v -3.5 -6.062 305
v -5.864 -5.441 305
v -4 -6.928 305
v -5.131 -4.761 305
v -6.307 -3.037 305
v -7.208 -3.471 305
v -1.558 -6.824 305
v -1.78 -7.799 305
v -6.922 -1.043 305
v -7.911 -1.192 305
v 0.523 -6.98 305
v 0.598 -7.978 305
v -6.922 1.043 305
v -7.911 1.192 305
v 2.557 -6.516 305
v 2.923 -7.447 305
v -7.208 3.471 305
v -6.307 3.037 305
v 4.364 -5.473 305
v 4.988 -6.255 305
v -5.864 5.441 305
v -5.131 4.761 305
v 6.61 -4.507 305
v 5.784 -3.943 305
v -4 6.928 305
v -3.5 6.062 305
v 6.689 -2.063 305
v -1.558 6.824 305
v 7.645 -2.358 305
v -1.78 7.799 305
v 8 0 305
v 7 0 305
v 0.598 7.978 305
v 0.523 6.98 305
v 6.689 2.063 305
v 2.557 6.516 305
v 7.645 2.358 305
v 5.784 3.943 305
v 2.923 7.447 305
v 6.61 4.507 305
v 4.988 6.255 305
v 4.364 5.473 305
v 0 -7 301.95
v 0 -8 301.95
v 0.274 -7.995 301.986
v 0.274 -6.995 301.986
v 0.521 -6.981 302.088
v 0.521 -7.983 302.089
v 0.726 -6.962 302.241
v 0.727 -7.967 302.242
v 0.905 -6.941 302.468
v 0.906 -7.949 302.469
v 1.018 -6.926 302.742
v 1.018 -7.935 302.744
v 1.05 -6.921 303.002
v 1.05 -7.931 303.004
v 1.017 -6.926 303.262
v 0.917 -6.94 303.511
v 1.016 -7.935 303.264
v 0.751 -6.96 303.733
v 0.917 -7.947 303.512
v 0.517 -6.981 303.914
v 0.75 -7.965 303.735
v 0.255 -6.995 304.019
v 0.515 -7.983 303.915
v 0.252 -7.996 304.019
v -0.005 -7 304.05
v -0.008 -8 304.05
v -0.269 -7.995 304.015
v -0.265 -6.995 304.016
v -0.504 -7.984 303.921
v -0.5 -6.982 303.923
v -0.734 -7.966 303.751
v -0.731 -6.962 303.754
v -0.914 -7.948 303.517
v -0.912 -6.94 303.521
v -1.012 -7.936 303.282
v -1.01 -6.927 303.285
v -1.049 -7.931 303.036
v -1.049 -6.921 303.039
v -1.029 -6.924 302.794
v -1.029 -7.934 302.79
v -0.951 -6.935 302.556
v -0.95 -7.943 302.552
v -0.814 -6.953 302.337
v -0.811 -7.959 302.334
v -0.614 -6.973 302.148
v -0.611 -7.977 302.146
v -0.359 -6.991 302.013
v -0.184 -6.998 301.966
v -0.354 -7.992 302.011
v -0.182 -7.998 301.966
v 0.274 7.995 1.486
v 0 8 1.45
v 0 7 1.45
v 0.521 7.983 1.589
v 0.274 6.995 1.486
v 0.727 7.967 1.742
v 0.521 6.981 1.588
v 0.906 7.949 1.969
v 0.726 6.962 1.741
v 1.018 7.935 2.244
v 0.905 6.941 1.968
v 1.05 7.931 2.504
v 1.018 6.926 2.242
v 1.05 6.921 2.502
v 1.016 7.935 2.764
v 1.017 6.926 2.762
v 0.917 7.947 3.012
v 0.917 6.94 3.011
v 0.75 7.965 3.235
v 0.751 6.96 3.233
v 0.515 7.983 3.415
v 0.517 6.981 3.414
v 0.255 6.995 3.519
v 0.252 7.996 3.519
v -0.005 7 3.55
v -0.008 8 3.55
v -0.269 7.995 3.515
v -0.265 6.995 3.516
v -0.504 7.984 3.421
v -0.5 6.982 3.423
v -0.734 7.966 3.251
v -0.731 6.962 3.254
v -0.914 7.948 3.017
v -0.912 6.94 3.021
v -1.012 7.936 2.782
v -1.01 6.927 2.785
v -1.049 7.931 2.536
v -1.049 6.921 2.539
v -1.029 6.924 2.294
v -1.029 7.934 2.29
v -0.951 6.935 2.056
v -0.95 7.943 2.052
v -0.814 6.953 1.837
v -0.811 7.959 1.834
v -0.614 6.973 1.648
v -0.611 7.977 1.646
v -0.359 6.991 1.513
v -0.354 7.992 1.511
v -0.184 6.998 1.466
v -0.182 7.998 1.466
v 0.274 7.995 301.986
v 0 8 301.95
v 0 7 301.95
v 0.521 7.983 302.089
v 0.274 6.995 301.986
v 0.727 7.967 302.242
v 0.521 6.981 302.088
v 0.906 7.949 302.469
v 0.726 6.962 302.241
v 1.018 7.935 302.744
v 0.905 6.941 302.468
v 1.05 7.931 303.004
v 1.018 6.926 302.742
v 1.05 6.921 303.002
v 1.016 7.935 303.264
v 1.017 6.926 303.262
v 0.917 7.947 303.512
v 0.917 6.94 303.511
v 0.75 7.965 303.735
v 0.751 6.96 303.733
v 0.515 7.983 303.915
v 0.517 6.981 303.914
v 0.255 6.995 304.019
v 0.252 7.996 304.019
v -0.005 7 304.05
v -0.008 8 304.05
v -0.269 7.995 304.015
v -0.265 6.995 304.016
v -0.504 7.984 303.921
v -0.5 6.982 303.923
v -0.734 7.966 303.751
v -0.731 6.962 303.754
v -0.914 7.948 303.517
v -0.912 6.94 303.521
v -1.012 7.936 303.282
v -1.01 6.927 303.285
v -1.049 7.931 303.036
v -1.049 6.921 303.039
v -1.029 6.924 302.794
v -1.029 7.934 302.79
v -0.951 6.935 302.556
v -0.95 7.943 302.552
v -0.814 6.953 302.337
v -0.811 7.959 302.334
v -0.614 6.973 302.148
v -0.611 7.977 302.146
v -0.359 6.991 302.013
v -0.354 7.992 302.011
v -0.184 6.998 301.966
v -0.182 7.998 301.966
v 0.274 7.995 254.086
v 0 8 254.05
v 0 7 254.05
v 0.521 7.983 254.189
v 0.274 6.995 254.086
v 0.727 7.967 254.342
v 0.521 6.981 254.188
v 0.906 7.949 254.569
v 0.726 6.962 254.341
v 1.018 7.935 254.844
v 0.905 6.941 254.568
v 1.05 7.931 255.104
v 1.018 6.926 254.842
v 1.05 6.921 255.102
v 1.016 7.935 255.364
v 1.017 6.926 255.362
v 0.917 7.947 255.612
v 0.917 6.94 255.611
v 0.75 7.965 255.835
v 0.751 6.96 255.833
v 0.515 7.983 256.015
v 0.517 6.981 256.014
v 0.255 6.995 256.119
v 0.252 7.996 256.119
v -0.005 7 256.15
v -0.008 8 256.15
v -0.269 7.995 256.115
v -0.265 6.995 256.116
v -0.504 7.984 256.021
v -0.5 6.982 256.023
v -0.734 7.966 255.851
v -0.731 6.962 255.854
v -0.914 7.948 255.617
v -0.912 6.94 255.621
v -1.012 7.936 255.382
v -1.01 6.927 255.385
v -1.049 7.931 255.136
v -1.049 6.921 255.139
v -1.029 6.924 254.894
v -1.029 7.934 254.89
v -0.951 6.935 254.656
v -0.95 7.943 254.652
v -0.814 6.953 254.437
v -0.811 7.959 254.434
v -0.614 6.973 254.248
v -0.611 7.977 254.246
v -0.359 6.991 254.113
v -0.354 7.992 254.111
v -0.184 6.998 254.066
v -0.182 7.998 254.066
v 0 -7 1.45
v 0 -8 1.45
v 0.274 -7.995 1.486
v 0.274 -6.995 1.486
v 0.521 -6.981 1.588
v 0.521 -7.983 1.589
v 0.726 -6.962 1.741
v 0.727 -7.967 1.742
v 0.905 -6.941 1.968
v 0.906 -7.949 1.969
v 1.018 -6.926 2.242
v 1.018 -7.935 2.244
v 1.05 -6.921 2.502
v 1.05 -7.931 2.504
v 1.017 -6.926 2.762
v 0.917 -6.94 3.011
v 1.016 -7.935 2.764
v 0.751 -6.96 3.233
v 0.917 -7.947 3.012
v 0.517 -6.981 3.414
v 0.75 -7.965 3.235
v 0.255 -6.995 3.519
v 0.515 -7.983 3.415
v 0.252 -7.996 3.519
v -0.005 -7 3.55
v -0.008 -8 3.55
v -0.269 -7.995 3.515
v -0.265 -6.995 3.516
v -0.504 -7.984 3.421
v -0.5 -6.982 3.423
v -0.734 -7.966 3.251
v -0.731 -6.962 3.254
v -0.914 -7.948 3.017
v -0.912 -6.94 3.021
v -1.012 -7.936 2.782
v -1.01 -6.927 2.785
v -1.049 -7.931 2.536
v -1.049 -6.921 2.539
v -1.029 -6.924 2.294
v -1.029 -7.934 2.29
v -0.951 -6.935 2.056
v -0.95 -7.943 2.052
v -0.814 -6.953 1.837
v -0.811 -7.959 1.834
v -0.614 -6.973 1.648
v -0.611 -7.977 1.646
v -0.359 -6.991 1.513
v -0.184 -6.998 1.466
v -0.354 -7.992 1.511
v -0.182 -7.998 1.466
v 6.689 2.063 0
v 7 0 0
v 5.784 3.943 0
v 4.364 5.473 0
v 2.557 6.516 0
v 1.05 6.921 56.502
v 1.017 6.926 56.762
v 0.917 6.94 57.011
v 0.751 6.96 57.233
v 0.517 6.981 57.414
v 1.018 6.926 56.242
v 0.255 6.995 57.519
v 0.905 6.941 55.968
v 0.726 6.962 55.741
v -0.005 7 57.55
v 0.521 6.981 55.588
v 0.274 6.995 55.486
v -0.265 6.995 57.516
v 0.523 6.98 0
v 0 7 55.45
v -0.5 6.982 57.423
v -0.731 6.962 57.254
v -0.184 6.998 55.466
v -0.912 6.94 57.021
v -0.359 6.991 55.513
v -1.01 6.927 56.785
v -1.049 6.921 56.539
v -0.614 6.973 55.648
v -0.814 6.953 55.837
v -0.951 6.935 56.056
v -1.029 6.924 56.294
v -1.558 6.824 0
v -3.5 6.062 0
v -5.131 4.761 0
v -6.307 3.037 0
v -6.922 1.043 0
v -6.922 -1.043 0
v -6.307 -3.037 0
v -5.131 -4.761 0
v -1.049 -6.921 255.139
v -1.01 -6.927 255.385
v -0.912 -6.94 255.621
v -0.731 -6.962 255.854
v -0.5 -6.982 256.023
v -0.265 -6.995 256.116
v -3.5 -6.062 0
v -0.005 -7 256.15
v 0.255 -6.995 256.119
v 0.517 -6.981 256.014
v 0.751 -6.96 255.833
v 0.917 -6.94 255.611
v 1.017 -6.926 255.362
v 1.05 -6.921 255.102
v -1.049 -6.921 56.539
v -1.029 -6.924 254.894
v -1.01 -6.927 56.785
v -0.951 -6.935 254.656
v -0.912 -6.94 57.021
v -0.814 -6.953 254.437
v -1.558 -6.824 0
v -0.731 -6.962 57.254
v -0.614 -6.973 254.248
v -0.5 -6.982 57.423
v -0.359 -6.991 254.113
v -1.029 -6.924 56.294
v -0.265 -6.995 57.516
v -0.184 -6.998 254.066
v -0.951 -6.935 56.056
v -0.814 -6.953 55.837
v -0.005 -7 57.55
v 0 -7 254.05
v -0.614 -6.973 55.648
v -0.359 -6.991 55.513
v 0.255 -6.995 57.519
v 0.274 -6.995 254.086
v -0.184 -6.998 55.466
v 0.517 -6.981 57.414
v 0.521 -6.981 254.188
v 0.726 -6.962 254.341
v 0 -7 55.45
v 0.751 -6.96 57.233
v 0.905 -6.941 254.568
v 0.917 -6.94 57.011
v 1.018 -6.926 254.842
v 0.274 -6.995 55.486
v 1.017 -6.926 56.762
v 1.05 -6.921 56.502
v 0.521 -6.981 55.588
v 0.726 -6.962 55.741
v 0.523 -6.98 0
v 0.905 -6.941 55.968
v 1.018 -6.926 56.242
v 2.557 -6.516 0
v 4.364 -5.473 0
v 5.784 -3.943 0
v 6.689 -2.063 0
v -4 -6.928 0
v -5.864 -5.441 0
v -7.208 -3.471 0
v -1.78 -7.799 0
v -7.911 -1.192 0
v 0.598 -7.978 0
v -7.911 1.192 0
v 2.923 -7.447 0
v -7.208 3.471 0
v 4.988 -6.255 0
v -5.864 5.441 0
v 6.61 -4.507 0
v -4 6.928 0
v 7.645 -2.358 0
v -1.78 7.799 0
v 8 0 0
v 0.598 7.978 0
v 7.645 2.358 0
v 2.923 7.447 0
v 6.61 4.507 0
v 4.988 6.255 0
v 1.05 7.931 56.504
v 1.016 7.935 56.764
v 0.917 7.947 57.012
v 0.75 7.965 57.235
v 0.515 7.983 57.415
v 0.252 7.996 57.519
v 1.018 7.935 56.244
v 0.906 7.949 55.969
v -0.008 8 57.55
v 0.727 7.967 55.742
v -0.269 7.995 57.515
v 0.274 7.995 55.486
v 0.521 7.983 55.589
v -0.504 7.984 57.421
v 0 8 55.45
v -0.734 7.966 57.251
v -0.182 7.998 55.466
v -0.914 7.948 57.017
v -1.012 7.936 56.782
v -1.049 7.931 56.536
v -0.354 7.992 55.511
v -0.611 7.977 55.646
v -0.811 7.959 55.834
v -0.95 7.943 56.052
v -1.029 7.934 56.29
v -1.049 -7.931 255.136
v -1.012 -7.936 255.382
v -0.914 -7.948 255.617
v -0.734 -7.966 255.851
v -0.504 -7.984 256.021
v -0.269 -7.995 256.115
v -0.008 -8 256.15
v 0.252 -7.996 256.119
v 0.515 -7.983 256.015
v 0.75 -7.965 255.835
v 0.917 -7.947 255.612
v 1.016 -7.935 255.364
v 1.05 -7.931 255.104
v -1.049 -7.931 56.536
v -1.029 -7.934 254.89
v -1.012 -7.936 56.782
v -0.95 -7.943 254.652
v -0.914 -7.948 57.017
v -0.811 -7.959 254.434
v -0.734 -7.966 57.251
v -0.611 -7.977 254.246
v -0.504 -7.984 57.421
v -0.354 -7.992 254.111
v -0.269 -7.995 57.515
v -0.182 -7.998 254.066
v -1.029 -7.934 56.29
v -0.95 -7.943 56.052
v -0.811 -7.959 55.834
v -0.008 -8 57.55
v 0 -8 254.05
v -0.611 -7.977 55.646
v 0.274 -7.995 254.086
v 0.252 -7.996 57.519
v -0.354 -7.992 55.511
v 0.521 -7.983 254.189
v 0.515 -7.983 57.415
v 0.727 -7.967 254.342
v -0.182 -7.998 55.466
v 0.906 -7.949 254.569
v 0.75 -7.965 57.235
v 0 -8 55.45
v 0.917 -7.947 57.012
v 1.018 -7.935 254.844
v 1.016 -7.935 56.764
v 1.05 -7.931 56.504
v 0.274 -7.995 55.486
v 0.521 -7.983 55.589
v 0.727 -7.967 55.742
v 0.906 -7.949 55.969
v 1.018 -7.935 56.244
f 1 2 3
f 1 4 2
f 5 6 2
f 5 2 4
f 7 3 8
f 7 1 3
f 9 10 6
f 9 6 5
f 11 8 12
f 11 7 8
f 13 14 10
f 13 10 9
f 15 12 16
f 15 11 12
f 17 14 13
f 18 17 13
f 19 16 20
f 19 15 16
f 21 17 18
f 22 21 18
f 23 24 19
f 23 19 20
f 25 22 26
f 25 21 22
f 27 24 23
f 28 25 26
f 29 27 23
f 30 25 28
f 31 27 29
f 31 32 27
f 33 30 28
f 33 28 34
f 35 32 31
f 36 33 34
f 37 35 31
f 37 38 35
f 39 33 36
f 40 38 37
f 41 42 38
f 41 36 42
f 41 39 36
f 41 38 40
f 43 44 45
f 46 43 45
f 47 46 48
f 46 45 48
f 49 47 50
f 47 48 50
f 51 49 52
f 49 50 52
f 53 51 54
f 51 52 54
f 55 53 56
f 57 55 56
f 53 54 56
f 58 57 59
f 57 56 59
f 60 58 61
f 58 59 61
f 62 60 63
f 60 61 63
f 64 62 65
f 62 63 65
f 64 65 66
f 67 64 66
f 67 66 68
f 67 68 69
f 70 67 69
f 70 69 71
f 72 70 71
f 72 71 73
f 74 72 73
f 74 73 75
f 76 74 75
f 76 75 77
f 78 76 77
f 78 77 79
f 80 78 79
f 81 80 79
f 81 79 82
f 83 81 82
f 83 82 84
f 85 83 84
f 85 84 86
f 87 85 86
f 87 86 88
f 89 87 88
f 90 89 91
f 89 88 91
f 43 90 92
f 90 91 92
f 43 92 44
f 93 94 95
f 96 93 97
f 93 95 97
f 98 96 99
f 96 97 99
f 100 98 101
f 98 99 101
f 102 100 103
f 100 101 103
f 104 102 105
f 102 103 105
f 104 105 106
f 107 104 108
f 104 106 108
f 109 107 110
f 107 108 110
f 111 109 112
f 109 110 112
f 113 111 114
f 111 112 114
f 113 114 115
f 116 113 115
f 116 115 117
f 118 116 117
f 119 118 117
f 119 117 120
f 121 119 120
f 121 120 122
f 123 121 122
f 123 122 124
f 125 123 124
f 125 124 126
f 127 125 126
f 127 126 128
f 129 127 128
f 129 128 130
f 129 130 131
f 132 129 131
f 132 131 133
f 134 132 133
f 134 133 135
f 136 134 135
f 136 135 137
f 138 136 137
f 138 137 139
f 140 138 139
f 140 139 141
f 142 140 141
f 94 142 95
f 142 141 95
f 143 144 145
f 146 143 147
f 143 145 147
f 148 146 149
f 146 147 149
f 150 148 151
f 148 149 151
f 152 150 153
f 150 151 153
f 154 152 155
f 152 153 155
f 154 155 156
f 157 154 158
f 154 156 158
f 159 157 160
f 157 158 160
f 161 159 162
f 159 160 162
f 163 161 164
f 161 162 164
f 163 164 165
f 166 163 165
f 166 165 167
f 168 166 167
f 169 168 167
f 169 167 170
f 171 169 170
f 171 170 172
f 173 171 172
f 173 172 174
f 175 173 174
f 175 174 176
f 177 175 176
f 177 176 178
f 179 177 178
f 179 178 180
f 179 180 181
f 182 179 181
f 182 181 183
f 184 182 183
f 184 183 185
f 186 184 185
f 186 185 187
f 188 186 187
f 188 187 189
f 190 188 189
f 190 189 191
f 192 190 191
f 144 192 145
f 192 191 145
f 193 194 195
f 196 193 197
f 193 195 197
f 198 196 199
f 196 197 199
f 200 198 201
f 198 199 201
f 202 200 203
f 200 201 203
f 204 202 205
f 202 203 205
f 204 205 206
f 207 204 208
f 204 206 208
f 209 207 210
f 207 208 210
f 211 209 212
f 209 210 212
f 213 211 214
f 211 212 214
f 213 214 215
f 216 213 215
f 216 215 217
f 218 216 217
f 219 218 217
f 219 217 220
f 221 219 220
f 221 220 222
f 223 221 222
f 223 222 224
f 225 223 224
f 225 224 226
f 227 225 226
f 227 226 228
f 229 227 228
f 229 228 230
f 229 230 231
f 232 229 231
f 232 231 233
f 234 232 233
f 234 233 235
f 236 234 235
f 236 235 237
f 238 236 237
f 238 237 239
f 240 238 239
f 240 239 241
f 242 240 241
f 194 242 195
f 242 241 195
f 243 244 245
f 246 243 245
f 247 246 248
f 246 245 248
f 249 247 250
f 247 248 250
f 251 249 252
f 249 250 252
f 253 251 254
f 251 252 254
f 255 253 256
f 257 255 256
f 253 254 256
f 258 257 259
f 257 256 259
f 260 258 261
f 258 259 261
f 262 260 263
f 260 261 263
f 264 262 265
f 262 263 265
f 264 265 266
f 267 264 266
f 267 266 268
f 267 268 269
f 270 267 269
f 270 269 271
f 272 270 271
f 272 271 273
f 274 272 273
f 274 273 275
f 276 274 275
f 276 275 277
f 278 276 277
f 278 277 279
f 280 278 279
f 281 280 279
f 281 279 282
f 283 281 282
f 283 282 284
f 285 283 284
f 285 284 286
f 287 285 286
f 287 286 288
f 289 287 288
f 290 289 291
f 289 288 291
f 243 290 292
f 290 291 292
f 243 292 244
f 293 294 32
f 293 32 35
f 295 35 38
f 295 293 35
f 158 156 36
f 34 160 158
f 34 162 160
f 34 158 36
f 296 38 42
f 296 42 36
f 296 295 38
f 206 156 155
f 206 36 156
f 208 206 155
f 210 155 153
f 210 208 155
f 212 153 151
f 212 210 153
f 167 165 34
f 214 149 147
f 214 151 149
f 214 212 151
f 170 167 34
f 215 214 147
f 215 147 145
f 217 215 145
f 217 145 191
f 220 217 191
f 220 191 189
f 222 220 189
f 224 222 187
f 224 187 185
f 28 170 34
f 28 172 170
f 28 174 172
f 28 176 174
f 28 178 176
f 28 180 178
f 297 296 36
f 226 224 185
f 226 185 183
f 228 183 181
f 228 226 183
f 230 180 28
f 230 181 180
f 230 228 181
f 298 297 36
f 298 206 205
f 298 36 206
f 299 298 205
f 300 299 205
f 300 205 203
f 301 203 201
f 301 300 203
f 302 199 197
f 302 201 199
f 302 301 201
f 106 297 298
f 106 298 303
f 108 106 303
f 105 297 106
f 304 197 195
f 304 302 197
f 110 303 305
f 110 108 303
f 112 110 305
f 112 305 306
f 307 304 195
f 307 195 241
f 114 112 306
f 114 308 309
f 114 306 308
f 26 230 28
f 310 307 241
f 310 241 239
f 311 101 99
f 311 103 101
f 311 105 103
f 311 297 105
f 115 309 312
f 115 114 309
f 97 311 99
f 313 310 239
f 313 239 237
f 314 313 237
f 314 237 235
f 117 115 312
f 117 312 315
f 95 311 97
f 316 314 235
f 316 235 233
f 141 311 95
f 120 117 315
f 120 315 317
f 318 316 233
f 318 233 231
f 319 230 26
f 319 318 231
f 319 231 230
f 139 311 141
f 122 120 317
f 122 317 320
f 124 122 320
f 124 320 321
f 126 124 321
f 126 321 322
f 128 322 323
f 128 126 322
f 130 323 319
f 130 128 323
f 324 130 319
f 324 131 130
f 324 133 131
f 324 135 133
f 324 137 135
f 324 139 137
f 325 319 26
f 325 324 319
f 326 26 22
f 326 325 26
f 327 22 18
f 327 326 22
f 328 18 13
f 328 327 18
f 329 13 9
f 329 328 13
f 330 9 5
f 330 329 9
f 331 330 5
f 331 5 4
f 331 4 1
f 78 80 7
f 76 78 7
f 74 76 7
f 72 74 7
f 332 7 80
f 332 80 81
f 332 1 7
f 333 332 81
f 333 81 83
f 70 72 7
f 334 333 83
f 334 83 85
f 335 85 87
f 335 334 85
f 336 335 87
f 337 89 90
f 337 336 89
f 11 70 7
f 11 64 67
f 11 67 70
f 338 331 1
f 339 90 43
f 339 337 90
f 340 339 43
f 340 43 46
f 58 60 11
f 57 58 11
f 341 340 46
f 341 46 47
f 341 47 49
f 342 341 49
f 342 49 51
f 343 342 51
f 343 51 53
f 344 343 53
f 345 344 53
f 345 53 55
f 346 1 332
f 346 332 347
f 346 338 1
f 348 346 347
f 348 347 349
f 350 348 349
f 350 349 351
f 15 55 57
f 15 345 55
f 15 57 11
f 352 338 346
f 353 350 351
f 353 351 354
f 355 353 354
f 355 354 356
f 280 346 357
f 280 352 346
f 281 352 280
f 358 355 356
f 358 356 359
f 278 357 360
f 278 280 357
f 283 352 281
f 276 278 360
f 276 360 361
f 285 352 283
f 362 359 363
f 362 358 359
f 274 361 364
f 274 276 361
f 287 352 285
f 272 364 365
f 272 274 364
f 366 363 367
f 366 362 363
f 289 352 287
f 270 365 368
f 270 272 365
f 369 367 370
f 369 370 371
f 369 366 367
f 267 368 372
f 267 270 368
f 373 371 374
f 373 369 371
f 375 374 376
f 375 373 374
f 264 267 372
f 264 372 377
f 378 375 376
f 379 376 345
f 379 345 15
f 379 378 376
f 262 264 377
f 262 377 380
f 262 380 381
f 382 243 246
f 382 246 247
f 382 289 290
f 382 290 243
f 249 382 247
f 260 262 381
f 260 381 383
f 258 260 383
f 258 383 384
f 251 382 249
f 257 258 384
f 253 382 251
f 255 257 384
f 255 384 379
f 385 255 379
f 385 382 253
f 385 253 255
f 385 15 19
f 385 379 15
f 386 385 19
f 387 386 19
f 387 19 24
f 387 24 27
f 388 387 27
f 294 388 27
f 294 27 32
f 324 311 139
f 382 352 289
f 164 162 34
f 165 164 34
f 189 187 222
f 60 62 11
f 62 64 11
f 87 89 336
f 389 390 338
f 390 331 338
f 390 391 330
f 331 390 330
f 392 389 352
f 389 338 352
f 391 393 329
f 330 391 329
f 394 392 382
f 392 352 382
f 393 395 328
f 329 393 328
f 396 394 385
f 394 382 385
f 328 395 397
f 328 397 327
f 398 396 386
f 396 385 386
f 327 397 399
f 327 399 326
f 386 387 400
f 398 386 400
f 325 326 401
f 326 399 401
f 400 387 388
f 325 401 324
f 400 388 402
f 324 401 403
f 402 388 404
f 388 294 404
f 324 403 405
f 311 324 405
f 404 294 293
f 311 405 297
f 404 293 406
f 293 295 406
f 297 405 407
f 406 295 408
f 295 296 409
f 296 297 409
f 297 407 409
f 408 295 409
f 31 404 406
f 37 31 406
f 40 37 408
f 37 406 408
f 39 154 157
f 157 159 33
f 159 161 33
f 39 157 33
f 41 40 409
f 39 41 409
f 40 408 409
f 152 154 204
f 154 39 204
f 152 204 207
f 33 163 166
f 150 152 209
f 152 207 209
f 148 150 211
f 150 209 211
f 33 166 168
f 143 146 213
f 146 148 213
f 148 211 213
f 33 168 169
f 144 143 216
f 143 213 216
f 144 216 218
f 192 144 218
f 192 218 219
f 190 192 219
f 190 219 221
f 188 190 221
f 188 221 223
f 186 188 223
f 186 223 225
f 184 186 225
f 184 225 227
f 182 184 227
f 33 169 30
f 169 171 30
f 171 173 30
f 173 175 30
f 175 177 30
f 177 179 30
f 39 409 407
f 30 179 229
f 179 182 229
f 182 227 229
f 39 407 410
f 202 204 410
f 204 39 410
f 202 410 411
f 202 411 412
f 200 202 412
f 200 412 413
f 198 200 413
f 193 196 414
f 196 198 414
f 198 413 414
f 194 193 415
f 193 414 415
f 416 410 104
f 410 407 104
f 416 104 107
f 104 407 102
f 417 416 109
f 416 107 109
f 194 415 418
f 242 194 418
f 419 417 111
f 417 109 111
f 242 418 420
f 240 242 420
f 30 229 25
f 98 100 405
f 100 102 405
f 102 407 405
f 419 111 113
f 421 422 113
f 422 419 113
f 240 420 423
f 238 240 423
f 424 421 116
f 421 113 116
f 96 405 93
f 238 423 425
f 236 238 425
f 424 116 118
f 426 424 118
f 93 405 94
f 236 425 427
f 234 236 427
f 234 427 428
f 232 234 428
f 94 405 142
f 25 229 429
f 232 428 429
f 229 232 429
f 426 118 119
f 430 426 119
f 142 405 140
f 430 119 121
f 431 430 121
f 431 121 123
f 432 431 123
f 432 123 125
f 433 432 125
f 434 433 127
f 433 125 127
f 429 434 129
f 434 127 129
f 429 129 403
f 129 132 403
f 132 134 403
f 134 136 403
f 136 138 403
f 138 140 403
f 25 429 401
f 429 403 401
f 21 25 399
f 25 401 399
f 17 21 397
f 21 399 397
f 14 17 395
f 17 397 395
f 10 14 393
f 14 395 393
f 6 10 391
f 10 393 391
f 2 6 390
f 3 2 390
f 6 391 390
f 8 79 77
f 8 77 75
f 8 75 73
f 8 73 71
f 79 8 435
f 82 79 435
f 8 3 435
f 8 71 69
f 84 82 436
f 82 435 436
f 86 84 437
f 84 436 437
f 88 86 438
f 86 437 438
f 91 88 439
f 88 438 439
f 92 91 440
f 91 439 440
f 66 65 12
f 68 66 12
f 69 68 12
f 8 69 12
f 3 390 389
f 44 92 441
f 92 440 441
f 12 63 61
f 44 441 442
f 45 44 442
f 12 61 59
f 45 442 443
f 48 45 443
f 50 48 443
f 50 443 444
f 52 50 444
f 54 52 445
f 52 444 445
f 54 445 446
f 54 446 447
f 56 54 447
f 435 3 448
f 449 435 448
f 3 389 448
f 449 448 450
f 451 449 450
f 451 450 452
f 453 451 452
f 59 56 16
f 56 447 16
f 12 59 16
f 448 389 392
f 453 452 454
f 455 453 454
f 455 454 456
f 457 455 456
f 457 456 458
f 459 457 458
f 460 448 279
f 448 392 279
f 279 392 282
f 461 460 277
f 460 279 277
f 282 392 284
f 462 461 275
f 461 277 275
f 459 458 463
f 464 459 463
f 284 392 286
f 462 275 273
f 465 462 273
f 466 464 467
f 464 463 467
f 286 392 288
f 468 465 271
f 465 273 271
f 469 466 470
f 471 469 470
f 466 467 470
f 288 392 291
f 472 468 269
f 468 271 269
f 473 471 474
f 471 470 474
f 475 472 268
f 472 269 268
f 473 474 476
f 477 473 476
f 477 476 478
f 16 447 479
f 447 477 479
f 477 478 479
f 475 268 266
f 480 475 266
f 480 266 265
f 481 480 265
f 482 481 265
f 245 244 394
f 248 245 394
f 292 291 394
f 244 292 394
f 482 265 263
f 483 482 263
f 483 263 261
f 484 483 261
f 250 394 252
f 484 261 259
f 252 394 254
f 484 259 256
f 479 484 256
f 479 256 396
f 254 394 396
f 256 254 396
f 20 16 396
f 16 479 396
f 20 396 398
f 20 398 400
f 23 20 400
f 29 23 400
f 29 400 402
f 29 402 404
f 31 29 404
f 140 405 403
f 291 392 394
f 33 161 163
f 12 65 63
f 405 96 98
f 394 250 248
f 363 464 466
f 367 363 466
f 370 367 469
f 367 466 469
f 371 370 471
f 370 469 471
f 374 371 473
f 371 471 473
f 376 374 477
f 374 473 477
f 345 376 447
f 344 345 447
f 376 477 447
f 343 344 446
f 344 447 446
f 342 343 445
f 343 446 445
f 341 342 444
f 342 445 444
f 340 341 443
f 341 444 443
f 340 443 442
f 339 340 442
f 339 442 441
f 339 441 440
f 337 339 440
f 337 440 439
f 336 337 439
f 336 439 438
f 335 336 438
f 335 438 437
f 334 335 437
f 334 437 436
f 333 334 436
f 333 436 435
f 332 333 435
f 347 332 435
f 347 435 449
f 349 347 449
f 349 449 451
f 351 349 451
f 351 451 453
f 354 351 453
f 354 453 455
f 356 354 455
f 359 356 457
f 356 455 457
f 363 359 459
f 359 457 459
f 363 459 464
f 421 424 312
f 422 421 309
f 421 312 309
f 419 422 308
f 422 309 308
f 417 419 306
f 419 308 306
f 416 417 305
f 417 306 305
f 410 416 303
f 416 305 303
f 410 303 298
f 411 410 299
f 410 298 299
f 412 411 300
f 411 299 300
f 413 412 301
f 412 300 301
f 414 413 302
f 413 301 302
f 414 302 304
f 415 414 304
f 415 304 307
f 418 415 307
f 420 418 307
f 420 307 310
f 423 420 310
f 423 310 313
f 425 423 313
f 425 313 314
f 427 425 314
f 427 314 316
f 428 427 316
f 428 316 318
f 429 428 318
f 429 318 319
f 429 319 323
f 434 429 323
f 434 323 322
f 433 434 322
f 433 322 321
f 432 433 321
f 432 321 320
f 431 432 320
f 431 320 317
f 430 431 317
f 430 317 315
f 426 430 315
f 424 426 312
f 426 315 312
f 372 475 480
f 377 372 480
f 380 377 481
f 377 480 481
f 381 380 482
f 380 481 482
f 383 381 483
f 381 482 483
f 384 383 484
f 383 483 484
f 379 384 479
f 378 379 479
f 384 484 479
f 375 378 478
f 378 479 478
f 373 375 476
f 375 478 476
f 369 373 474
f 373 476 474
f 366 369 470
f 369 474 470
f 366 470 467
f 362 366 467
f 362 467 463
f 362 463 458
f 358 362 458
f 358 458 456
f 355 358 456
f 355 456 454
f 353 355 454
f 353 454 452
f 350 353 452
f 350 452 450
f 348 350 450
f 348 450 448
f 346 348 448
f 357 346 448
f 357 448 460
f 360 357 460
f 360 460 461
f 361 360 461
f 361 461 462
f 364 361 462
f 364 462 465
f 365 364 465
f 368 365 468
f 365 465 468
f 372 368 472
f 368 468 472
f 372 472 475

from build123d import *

# Parameters (mm, degrees)
SKETCH1_R           = 8
SKETCH1_R_2         = 7
BOSS_EXTRUDE1_DEPTH = 305
SKETCH2_R           = 1.05
CUT_EXTRUDE2_DEPTH  = 20


with BuildPart() as part:
    # Sketch1 → Boss-Extrude1 (new body)
    with BuildSketch(Plane.XY):
        Circle(SKETCH1_R)
        Circle(SKETCH1_R_2, mode=Mode.SUBTRACT)
    extrude(amount=BOSS_EXTRUDE1_DEPTH)

    # Sketch2 → Cut-Extrude2 (cut)
    with BuildSketch(Plane.XZ.offset(10)):
        with Locations(Location((0, 2.5, 0), (0, 0, 270))):
            Circle(SKETCH2_R)
        with Locations(Location((0, 56.5, 0), (0, 0, 270))):
            Circle(SKETCH2_R)
        with Locations(Location((0, 255.1, 0), (0, 0, 270))):
            Circle(SKETCH2_R)
        with Locations(Location((0, 303, 0), (0, 0, 270))):
            Circle(SKETCH2_R)
    extrude(amount=-CUT_EXTRUDE2_DEPTH, mode=Mode.SUBTRACT)


solid = part.part
